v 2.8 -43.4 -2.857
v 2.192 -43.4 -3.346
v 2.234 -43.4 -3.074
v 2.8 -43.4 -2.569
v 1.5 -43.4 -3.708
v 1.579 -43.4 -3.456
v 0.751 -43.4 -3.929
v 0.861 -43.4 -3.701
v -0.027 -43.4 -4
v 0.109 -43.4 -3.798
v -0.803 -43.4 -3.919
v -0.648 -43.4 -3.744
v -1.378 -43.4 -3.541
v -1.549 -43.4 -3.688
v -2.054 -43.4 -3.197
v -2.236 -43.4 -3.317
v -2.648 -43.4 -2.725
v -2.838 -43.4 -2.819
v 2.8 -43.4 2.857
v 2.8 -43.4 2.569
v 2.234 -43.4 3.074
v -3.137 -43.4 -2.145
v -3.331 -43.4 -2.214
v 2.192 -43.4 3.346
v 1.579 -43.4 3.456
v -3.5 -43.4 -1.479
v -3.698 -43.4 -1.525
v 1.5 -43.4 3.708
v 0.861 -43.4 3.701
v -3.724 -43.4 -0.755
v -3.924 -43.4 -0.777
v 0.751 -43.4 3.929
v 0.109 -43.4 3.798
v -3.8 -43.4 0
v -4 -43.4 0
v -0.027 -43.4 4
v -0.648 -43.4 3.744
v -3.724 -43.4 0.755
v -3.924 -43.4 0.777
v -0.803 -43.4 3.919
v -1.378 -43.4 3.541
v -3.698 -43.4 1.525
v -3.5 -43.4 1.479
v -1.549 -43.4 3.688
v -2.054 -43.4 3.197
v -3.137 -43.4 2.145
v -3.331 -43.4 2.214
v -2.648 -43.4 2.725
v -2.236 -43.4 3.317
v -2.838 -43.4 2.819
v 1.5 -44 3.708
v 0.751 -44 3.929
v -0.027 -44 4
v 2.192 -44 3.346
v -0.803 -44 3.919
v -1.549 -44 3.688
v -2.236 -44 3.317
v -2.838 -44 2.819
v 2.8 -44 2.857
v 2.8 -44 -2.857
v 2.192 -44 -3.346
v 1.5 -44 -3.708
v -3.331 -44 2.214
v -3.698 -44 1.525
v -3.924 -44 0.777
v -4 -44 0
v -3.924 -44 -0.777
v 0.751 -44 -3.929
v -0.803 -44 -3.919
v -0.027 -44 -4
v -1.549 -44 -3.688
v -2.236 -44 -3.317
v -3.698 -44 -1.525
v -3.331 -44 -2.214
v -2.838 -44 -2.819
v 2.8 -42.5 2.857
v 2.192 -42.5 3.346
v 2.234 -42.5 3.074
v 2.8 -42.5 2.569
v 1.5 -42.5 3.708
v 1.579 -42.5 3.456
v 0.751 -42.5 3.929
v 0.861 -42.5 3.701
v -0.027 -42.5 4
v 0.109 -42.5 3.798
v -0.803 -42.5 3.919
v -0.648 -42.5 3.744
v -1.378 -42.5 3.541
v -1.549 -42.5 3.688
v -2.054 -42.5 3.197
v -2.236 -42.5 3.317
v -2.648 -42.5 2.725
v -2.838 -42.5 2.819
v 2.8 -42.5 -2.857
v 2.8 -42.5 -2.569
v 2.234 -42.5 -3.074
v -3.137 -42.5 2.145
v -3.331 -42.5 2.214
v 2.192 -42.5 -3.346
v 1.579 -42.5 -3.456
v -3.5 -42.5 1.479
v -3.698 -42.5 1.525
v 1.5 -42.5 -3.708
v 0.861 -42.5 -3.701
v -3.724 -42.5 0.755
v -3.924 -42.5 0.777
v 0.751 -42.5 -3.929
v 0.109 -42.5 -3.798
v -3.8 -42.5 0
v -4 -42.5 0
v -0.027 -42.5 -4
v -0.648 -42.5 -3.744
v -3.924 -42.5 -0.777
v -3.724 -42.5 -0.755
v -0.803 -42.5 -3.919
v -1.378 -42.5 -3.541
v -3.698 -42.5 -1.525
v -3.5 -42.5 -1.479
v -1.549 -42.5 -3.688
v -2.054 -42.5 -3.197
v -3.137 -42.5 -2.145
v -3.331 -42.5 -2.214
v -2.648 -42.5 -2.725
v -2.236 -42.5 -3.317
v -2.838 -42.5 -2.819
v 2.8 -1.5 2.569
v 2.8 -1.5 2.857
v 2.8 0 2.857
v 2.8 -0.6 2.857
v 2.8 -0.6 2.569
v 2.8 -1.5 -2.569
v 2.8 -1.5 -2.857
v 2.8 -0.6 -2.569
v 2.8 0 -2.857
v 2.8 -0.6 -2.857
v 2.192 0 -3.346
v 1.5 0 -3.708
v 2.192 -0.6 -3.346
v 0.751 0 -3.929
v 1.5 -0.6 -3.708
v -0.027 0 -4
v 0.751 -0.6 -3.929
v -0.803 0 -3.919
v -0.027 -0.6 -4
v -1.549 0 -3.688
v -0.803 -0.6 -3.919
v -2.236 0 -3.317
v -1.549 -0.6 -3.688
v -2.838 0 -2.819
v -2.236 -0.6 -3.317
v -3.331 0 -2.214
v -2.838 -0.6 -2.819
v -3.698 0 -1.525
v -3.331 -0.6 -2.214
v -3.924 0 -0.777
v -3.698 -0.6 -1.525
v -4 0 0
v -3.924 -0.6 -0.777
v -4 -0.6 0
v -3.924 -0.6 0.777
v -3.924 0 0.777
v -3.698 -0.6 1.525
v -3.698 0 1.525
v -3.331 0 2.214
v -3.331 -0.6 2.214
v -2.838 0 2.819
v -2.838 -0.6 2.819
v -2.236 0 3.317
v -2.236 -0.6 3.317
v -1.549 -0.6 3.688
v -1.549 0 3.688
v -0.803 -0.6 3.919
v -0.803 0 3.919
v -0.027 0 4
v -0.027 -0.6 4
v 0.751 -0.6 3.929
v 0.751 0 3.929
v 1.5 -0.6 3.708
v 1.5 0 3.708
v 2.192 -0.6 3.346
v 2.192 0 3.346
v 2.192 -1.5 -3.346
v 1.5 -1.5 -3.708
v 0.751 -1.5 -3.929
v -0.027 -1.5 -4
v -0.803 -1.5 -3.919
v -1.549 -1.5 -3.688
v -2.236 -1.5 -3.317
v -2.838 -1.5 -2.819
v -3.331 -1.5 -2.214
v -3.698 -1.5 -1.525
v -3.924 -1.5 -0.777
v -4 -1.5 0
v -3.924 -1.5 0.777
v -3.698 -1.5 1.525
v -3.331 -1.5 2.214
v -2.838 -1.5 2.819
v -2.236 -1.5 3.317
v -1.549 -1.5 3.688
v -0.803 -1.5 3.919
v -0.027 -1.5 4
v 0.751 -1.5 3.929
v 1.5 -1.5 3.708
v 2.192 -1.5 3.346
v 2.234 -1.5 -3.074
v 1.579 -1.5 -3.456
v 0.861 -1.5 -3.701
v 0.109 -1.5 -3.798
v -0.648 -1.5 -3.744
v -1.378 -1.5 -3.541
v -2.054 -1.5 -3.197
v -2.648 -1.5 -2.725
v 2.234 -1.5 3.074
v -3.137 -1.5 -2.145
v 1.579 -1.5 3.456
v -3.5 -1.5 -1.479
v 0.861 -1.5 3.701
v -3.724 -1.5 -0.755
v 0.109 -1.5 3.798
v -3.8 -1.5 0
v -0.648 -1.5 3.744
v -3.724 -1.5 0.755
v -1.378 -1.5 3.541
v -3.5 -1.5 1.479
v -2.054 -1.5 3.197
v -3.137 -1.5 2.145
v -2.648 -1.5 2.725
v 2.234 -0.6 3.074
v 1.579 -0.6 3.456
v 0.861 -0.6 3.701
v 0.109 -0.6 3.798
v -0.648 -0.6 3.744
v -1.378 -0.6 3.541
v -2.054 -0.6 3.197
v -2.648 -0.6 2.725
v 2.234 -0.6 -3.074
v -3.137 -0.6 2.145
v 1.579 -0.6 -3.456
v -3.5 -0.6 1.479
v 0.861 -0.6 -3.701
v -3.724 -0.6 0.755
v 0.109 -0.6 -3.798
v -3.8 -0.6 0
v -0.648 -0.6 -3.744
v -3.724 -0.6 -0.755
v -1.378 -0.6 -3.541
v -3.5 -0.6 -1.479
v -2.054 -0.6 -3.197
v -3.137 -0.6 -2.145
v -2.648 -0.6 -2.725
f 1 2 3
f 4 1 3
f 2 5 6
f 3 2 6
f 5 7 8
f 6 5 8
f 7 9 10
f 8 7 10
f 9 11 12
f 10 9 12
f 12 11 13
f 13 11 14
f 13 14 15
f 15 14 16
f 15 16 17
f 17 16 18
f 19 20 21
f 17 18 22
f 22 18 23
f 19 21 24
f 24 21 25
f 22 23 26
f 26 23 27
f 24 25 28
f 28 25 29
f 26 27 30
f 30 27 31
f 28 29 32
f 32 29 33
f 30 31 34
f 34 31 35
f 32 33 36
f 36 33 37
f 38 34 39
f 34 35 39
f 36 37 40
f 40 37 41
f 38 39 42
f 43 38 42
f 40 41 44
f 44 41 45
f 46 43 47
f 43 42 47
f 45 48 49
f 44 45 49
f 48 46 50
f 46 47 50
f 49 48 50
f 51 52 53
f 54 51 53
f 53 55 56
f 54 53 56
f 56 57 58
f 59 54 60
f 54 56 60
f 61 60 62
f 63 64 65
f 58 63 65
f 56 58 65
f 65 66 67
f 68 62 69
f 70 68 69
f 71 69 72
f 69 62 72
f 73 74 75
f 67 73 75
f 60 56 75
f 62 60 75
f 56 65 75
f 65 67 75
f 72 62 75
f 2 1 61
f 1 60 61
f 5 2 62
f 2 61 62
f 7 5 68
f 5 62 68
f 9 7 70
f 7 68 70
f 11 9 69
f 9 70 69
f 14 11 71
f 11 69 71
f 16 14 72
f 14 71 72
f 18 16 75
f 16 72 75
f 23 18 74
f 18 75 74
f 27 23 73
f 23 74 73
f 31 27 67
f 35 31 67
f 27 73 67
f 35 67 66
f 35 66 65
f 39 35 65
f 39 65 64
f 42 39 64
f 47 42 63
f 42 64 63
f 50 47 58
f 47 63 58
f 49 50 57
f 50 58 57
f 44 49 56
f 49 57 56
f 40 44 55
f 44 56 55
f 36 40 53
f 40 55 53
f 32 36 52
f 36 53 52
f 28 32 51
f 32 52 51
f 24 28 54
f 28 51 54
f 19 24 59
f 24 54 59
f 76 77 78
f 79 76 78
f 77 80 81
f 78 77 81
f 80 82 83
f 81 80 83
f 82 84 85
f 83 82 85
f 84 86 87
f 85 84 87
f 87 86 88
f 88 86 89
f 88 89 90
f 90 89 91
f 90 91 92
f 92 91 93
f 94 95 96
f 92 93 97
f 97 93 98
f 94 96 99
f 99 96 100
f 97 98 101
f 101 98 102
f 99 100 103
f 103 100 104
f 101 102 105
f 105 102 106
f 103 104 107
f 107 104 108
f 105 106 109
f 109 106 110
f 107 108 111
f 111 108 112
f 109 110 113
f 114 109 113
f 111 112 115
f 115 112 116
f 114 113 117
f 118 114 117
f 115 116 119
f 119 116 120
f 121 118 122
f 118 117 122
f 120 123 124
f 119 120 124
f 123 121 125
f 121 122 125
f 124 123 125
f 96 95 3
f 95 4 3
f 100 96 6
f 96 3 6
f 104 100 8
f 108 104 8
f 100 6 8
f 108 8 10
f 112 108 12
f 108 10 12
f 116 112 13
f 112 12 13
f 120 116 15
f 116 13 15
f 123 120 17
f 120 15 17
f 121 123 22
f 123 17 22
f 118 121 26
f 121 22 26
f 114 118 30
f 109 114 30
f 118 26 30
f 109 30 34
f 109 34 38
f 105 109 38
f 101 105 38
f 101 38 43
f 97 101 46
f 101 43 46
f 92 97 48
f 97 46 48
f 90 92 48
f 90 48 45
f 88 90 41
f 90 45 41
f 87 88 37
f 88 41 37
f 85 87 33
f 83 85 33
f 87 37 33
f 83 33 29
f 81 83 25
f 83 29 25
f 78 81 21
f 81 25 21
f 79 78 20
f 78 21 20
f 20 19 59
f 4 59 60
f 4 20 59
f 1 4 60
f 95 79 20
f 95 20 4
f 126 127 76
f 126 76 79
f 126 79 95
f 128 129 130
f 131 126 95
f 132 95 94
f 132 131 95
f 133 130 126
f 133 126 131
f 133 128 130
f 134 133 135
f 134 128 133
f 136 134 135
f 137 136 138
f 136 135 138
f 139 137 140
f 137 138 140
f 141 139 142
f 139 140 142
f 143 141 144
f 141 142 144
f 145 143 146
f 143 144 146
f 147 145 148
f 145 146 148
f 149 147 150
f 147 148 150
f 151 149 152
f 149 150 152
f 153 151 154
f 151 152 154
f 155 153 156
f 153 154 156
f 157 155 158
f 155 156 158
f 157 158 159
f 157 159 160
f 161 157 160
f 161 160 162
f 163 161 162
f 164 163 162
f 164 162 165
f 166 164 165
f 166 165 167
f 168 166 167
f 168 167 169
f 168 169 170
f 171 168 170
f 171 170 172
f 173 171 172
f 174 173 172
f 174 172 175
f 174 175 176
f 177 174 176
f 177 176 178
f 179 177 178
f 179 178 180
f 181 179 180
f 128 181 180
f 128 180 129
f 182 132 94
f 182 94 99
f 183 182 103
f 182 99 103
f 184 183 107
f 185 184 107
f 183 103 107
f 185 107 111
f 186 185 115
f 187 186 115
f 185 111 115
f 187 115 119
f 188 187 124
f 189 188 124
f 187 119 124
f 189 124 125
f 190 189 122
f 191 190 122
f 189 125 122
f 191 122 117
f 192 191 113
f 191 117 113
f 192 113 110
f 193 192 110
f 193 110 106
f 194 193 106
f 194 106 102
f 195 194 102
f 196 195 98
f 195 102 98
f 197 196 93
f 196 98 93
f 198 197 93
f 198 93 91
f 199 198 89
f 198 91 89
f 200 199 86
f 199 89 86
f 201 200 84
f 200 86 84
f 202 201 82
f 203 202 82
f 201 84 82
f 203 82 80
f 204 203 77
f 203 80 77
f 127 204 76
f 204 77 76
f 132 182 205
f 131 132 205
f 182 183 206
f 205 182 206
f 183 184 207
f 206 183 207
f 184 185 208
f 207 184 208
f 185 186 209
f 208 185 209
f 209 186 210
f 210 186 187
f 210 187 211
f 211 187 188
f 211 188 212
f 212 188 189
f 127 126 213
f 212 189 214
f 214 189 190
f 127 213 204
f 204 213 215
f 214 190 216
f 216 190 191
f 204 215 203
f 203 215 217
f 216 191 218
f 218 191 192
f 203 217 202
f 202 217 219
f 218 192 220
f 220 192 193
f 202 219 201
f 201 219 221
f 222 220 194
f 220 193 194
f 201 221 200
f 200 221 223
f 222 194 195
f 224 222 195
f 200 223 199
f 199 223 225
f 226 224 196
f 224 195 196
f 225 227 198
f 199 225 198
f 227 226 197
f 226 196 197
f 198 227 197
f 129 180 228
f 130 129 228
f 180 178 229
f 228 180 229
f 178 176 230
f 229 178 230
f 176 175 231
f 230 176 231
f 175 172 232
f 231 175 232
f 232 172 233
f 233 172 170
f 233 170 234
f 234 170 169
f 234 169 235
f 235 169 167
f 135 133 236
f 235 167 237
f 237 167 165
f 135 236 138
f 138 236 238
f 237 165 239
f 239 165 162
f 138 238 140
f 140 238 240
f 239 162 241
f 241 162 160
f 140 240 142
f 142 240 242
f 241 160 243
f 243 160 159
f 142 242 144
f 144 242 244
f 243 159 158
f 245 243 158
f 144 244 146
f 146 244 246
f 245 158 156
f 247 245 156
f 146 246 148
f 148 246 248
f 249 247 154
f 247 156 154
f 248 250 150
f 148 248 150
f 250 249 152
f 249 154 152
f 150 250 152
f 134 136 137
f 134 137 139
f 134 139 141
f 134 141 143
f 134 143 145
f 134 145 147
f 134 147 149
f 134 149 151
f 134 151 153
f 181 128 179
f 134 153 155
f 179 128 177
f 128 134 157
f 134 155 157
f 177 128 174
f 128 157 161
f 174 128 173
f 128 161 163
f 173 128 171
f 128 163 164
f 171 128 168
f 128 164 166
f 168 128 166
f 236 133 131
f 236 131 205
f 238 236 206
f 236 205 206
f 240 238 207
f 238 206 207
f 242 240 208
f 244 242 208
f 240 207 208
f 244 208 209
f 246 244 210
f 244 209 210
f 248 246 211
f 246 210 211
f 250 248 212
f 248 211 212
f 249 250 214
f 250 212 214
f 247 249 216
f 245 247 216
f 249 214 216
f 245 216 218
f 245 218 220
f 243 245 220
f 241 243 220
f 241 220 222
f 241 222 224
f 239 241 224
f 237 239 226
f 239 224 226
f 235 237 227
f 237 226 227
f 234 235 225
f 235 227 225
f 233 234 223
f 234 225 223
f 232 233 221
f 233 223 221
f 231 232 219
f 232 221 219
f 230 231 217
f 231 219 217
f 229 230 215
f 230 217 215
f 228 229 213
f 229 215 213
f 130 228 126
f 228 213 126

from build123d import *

# Parameters (mm, degrees)
CUT_EXTRUDE1_DEPTH = 45.362146026


with BuildPart() as part:
    # Sketch1 → Revolve1 (revolve)
    with BuildSketch(Plane.XY, mode=Mode.PRIVATE) as revolve1_sk:
        Polygon((0, 0), (-4, 0), (-4, -0.6), (-3.8, -0.6), (-3.8, -1.5), (-4, -1.5), (-4, -42.5), (-3.8, -42.5), (-3.8, -43.4), (-4, -43.4), (-4, -44), (0, -44), align=None)
    revolve(revolve1_sk.sketch.rotate(Axis((0, -44, 0), (0, 1, 0)), 270), axis=Axis((0, -44, 0), (0, 1, 0)))

    # Sketch2 → Cut-Extrude1 (cut, through all)
    with BuildSketch(Plane(origin=(0, 0, 0), x_dir=(1, 0, 0), z_dir=(0, 1, 0))):
        with BuildLine():
            Line((2.8, -2.856571371), (2.8, 2.856571371))
            ThreePointArc((2.8, 2.856571371), (4, 0), (2.8, -2.856571371))
        make_face()
    extrude(amount=-CUT_EXTRUDE1_DEPTH, mode=Mode.SUBTRACT)


solid = part.part
